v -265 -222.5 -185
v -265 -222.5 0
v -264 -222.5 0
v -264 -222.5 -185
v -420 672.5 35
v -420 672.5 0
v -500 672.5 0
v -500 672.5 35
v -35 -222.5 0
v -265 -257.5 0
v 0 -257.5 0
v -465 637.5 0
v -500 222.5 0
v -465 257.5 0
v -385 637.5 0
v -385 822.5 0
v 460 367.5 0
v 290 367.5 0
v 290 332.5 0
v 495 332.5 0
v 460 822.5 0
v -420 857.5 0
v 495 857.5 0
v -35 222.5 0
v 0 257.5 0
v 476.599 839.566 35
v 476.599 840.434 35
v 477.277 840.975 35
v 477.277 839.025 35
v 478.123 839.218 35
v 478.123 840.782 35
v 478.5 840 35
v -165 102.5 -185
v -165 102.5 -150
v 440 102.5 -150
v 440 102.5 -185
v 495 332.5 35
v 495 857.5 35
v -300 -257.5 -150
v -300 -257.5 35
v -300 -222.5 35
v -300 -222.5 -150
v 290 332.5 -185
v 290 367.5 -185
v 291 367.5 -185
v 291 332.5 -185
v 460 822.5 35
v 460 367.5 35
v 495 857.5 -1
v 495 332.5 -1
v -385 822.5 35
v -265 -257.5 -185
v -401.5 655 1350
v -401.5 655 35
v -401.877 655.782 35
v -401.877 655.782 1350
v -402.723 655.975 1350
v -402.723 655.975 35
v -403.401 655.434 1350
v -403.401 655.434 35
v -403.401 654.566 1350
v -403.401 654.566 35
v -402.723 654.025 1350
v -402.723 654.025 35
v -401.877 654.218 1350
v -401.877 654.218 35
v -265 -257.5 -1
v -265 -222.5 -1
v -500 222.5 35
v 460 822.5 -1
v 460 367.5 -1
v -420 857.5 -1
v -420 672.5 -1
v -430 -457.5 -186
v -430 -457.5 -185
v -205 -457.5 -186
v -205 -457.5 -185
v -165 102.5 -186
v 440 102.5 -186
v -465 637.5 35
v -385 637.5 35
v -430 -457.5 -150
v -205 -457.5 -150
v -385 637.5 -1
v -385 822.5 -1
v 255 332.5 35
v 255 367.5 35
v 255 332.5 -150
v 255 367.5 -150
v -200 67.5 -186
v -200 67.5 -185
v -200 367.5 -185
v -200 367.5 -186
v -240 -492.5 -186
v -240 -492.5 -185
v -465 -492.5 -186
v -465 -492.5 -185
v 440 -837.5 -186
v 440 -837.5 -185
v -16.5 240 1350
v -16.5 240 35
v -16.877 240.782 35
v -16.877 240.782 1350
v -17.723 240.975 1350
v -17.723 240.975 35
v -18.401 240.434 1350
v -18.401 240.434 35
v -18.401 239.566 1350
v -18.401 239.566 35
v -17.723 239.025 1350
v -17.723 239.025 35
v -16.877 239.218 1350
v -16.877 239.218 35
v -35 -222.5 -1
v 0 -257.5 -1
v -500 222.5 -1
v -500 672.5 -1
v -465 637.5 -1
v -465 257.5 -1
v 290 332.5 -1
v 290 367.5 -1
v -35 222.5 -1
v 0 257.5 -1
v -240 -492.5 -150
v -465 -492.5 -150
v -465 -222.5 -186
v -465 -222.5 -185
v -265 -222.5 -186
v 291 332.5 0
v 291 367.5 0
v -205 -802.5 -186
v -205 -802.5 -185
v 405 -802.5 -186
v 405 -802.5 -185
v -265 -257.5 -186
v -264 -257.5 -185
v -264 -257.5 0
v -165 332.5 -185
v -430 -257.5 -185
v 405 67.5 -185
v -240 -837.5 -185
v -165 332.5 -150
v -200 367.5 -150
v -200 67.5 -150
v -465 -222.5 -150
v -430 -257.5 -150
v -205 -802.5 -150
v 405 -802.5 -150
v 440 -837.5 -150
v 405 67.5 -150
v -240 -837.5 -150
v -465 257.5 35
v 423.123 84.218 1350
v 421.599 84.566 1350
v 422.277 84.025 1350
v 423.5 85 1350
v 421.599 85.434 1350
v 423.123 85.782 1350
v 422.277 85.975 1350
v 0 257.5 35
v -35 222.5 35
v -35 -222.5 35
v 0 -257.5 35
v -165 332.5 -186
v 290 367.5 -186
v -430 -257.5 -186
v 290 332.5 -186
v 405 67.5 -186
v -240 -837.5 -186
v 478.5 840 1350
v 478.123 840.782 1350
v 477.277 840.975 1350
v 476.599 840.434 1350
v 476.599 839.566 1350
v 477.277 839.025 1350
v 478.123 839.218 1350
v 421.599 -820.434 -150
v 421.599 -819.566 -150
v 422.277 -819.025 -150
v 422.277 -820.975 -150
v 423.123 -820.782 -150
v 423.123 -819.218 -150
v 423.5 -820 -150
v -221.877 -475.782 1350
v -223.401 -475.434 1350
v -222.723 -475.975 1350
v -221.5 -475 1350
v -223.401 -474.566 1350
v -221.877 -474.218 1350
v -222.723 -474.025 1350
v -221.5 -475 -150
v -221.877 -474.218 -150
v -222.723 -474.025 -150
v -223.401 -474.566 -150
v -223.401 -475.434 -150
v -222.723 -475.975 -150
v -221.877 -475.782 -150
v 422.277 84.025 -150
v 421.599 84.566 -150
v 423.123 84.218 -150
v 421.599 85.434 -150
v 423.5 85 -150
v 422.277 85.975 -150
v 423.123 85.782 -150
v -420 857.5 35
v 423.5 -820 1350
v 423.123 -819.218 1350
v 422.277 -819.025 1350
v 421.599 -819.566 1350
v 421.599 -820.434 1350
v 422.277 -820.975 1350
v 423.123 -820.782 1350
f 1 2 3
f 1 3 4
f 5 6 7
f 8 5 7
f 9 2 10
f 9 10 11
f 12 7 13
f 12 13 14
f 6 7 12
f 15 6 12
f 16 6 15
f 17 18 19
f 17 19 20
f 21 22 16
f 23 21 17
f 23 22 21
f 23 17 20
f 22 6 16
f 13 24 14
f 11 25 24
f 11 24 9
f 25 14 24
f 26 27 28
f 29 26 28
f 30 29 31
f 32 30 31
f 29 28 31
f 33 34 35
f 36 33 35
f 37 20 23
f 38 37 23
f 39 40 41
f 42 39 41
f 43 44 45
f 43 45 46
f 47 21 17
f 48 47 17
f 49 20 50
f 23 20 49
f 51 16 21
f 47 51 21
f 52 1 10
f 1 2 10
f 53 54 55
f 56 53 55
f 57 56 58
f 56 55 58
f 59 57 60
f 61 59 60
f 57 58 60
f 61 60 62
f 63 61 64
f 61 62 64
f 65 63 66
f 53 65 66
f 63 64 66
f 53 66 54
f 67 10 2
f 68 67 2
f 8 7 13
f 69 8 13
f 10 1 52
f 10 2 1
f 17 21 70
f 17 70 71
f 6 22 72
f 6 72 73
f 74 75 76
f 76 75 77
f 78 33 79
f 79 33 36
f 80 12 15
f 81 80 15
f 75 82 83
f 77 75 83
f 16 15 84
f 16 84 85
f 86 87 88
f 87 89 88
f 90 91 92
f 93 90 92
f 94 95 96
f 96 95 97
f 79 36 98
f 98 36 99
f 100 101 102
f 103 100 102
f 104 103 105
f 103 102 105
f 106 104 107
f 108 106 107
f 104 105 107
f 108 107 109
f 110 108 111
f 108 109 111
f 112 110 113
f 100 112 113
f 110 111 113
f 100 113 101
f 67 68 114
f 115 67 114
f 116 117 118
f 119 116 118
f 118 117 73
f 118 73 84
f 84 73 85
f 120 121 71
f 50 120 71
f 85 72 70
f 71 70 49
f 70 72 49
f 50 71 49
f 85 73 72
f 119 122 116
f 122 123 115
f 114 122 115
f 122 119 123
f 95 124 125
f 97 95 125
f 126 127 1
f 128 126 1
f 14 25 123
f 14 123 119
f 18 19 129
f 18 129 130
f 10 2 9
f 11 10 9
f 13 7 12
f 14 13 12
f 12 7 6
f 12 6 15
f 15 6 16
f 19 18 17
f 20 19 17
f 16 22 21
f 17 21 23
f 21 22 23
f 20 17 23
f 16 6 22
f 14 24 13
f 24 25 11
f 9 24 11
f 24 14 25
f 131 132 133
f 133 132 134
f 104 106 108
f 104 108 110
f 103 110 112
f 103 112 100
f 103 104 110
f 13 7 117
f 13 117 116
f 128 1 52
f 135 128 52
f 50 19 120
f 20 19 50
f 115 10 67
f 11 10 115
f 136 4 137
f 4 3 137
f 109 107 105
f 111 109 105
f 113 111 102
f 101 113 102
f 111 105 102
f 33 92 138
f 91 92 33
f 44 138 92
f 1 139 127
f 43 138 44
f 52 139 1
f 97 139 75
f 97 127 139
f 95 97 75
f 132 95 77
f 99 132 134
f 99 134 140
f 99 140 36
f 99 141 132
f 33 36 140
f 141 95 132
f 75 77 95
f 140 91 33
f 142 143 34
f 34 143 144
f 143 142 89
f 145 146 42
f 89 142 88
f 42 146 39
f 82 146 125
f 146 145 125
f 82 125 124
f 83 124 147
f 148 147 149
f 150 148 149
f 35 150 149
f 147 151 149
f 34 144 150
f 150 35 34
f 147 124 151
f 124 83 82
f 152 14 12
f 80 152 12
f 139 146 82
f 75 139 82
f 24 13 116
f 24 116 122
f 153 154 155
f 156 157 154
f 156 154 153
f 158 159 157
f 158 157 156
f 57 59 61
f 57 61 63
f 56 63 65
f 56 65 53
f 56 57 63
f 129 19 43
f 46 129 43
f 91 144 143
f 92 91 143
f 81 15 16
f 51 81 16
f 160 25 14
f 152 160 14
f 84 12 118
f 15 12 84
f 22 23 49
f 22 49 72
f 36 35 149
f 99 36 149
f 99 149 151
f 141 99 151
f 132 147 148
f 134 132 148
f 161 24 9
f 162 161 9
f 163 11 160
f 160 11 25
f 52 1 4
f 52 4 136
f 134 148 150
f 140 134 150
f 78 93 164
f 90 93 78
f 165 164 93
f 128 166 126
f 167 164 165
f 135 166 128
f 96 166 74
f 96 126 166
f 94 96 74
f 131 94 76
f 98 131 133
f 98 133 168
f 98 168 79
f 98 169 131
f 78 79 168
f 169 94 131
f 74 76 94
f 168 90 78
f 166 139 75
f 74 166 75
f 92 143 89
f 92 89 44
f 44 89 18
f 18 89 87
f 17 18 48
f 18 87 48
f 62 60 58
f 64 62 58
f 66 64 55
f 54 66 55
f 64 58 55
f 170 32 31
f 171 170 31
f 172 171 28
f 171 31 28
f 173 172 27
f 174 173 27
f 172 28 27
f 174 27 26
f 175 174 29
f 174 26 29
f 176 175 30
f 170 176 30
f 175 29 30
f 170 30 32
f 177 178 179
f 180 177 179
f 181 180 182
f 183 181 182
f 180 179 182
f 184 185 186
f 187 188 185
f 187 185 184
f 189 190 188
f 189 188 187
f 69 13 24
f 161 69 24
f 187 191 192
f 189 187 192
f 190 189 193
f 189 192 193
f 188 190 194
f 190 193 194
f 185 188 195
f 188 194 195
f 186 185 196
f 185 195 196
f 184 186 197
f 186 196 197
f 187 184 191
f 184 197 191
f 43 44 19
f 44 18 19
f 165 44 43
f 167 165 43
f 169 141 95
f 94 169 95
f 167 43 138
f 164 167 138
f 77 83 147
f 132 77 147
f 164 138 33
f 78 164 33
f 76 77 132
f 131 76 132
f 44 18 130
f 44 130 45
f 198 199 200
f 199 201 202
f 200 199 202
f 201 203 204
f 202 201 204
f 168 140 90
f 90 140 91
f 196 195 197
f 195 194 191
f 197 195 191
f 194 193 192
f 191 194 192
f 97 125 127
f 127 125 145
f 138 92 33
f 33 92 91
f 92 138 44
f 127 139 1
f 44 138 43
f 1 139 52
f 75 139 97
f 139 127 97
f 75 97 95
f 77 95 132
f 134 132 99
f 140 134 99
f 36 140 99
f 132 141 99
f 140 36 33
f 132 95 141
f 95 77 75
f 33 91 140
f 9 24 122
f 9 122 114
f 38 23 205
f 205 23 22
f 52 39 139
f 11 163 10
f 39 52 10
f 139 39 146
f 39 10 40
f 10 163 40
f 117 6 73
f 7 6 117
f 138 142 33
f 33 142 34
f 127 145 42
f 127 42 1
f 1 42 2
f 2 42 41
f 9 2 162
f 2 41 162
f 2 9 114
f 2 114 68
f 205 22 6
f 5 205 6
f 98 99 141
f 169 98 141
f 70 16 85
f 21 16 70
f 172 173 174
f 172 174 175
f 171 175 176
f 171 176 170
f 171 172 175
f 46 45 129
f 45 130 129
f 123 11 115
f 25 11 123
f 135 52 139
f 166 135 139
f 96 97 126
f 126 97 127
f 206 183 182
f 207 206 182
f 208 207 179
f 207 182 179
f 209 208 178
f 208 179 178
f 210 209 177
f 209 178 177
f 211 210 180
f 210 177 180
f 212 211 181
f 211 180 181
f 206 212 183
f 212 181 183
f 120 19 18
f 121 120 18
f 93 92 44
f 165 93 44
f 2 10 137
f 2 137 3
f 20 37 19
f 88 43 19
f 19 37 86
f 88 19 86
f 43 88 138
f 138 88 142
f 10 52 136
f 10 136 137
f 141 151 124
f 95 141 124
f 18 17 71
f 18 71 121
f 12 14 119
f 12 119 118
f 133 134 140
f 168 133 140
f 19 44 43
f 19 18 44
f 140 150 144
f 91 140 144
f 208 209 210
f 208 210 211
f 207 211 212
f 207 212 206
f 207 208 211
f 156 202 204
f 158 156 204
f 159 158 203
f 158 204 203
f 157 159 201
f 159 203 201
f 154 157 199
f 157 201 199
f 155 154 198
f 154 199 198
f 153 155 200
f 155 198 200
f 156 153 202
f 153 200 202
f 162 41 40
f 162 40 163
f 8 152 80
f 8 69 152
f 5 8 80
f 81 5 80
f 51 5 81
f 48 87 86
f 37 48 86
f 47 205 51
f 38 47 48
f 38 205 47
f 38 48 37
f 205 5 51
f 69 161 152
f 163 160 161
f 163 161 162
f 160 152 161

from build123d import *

# Parameters (mm, degrees)
F1_DEPTH  = 35
F2_W      = 35
F2_H      = 35
F3_DEPTH  = 150
F6_DEPTH  = 35
F7_DEPTH  = 1
F8_DEPTH  = 1
F9_DEPTH  = 1
F10_R     = 1
F11_DEPTH = 1500
F12_R     = 1
F13_DEPTH = 1315


with BuildPart() as f1:
    # F0 (on Top) → F1 (new body)
    with BuildSketch(Plane.XY):
        Polygon((460, 822.5), (460, 367.5), (255, 367.5), (255, 332.5), (495, 332.5), (495, 857.5), (-420, 857.5), (-420, 672.5), (-500, 672.5), (-500, 222.5), (-35, 222.5), (-35, -222.5), (-300, -222.5), (-300, -257.5), (0, -257.5), (0, 257.5), (-465, 257.5), (-465, 637.5), (-385, 637.5), (-385, 822.5), align=None)
    extrude(amount=F1_DEPTH)

    # F2 (on Top) → F3 (join)
    with BuildSketch(Plane.XY):
        with Locations((-282.5, -240)):
            Rectangle(F2_W, F2_H)
        with Locations((272.5, 350)):
            Rectangle(F2_W, F2_H)
    extrude(amount=-F3_DEPTH)

    # F5 (on offset) → F6 (join)
    with BuildSketch(Plane(origin=(0, 0, -150), x_dir=(1, 0, 0), z_dir=(0, 0, -1))):
        Polygon((-200, -67.5), (-200, -367.5), (290, -367.5), (290, -332.5), (-165, -332.5), (-165, -102.5), (440, -102.5), (440, 837.5), (-240, 837.5), (-240, 492.5), (-465, 492.5), (-465, 222.5), (-265, 222.5), (-265, 257.5), (-430, 257.5), (-430, 457.5), (-205, 457.5), (-205, 802.5), (405, 802.5), (405, -67.5), align=None)
    extrude(amount=F6_DEPTH)


with BuildPart() as f7:
    # F7 (new): a face of the model
    f7_faces = [f1.part.faces().sort_by_distance(p)[0] for p in [
        (-184.9299966822, 217.5, -185),
    ]]
    extrude(f7_faces, amount=F7_DEPTH)


with BuildPart() as f8:
    # F8 (new): a face of the model
    f8_faces = [f1.part.faces().sort_by_distance(p)[0] for p in [
        (-265, -240, -92.5),
    ]]
    extrude(f8_faces, amount=F8_DEPTH)


with BuildPart() as f8b:
    # F8#2 (new): a face of the model
    f8_2_faces = [f1.part.faces().sort_by_distance(p)[0] for p in [
        (290, 350, -92.5),
    ]]
    extrude(f8_2_faces, amount=F8_DEPTH)


with BuildPart() as f9:
    # F9 (new): a face of the model
    f9_faces = [f1.part.faces().sort_by_distance(p)[0] for p in [
        (37.5, 837.444062366, 0),
    ]]
    extrude(f9_faces, amount=F9_DEPTH)


with BuildPart() as f11:
    # F10 (on face) → F11 (new body)
    with BuildSketch(Plane.XY.offset(-150)):
        with Locations((-222.5, -475)):
            Circle(F10_R)
    extrude(amount=F11_DEPTH)


with BuildPart() as f11b:
    # F10 (on face) → F11, piece 2 (new body)
    with BuildSketch(Plane.XY.offset(-150)):
        with Locations((422.5, 85)):
            Circle(F10_R)
    extrude(amount=F11_DEPTH)


with BuildPart() as f11c:
    # F10 (on face) → F11, piece 3 (new body)
    with BuildSketch(Plane.XY.offset(-150)):
        with Locations((422.5, -820)):
            Circle(F10_R)
    extrude(amount=F11_DEPTH)


with BuildPart() as f13:
    # F12 (on face) → F13 (new body)
    with BuildSketch(Plane.XY.offset(35)):
        with Locations((-402.5, 655)):
            Circle(F12_R)
    extrude(amount=F13_DEPTH)


with BuildPart() as f13b:
    # F12 (on face) → F13, piece 2 (new body)
    with BuildSketch(Plane.XY.offset(35)):
        with Locations((477.5, 840)):
            Circle(F12_R)
    extrude(amount=F13_DEPTH)


with BuildPart() as f13c:
    # F12 (on face) → F13, piece 3 (new body)
    with BuildSketch(Plane.XY.offset(35)):
        with Locations((-17.5, 240)):
            Circle(F12_R)
    extrude(amount=F13_DEPTH)


solid = Compound([f1.part, f7.part, f8.part, f8b.part, f9.part, f11.part, f11b.part, f11c.part, f13.part, f13b.part, f13c.part])
